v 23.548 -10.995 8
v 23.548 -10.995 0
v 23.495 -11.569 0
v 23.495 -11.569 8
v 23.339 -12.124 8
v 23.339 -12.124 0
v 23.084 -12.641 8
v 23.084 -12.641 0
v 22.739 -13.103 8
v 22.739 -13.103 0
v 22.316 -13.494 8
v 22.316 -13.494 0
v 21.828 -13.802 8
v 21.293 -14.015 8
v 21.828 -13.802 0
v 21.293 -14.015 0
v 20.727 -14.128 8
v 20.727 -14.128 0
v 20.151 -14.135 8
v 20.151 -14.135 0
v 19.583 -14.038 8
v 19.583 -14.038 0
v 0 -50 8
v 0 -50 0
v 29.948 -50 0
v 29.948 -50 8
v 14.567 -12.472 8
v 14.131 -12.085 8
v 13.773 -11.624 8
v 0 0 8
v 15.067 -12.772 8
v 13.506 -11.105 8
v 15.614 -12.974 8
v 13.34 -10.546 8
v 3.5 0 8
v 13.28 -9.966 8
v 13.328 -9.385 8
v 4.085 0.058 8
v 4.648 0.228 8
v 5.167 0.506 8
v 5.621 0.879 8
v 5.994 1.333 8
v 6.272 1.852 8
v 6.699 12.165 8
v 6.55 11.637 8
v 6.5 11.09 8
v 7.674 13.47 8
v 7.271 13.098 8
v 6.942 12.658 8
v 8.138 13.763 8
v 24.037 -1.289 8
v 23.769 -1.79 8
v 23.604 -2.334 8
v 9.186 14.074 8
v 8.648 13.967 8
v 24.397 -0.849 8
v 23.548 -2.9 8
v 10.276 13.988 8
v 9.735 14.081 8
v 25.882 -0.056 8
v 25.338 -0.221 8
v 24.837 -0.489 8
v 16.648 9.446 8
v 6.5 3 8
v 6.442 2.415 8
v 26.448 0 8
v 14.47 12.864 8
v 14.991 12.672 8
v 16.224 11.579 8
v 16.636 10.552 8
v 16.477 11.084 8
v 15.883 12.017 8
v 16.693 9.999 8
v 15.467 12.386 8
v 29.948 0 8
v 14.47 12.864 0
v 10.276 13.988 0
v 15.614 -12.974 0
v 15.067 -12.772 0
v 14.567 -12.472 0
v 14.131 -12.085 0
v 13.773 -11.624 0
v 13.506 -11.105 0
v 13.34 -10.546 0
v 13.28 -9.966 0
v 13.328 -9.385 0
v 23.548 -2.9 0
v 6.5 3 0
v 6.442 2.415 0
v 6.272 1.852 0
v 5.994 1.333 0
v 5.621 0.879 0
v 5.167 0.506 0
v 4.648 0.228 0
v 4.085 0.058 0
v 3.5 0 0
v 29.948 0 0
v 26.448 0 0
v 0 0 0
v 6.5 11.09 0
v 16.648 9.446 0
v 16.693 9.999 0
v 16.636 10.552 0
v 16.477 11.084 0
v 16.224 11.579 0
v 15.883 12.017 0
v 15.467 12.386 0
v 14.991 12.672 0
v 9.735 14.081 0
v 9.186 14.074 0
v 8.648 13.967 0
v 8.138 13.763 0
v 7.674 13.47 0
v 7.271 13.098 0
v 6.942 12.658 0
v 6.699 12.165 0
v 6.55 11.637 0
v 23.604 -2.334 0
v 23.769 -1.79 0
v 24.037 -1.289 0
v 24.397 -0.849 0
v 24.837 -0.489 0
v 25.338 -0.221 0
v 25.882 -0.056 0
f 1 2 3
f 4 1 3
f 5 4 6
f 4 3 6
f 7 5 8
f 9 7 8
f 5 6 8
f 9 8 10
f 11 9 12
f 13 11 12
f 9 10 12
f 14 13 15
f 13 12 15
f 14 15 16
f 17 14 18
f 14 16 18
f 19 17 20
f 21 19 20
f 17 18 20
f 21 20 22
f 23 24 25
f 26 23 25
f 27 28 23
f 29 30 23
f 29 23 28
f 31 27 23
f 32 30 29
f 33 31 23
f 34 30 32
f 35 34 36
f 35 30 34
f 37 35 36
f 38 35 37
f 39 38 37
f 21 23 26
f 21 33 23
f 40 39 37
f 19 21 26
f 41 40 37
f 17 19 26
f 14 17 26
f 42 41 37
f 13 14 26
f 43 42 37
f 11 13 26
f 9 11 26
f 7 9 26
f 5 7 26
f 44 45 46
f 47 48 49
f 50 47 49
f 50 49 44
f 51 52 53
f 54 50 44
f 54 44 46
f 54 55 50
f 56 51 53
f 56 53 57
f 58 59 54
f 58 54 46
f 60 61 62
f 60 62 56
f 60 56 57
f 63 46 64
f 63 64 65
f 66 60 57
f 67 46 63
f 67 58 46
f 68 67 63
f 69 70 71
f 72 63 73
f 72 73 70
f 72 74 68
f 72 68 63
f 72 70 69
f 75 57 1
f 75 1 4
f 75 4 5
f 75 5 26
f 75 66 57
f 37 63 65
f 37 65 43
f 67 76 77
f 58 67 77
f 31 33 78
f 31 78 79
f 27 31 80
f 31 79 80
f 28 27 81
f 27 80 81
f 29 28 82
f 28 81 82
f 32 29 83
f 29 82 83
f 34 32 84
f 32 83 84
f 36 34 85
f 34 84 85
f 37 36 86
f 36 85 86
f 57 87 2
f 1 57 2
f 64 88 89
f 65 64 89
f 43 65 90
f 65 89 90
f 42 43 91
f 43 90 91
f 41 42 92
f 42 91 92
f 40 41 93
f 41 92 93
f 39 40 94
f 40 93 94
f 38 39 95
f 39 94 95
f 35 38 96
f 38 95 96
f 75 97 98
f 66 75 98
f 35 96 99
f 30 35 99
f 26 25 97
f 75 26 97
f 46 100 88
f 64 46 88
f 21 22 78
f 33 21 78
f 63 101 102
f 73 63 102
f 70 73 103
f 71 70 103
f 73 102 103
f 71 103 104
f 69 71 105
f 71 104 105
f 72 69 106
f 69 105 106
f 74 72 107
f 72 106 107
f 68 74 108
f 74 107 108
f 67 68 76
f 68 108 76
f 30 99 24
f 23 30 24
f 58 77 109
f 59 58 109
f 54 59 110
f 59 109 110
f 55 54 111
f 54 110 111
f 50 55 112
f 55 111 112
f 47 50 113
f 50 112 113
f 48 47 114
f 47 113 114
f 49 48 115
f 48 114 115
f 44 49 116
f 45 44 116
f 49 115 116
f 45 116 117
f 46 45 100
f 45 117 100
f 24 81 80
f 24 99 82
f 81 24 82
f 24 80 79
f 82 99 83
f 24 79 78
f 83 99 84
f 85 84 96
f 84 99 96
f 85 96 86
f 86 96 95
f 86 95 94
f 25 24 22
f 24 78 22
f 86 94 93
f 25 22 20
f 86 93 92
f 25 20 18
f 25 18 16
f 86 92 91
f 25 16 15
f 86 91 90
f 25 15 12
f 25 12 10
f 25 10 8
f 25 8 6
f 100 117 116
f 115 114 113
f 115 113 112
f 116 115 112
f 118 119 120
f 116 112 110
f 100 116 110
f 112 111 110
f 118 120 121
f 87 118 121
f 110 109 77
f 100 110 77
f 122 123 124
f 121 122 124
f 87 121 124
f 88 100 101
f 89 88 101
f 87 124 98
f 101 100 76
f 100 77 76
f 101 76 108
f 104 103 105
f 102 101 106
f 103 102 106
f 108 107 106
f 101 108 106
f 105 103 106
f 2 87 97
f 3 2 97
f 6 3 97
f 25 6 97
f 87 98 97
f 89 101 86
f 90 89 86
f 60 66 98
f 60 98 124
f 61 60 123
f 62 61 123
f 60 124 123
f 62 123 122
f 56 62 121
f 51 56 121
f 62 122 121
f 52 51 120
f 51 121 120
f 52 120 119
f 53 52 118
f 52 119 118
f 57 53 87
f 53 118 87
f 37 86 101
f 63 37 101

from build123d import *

# Parameters (mm, degrees)
F1_DEPTH = 8


with BuildPart() as f1:
    # F0 (on Top) → F1 (new body)
    with BuildSketch(Plane.XY):
        with BuildLine():
            Line((3.5, 0), (0, 0))
            Line((0, 0), (0, -50))
            Line((0, -50), (29.948091, -50))
            Line((29.948091, -50), (29.948091, 0))
            Line((29.948091, 0), (26.448091, 0))
            ThreePointArc((26.448091, 0), (24.397482, -0.84939), (23.548091, -2.9))
            Line((23.548091, -2.9), (23.548091, -10.99484))
            ThreePointArc((23.548091, -10.99484), (22.31569, -13.493903), (19.582812, -14.037506))
            Line((19.582812, -14.037506), (15.614405, -12.974175))
            ThreePointArc((15.614405, -12.974175), (13.773002, -11.624002), (13.32754, -9.384517))
            Line((13.32754, -9.384517), (16.647826, 9.44576))
            ThreePointArc((16.647826, 9.44576), (16.223577, 11.578604), (14.46986, 12.864482))
            Line((14.46986, 12.864482), (10.276457, 13.988101))
            ThreePointArc((10.276457, 13.988101), (7.673716, 13.470384), (6.5, 11.090324))
            Line((6.5, 11.090324), (6.5, 3))
            ThreePointArc((6.5, 3), (5.62132, 0.87868), (3.5, 0))
        make_face()
    extrude(amount=F1_DEPTH)


solid = f1.part
